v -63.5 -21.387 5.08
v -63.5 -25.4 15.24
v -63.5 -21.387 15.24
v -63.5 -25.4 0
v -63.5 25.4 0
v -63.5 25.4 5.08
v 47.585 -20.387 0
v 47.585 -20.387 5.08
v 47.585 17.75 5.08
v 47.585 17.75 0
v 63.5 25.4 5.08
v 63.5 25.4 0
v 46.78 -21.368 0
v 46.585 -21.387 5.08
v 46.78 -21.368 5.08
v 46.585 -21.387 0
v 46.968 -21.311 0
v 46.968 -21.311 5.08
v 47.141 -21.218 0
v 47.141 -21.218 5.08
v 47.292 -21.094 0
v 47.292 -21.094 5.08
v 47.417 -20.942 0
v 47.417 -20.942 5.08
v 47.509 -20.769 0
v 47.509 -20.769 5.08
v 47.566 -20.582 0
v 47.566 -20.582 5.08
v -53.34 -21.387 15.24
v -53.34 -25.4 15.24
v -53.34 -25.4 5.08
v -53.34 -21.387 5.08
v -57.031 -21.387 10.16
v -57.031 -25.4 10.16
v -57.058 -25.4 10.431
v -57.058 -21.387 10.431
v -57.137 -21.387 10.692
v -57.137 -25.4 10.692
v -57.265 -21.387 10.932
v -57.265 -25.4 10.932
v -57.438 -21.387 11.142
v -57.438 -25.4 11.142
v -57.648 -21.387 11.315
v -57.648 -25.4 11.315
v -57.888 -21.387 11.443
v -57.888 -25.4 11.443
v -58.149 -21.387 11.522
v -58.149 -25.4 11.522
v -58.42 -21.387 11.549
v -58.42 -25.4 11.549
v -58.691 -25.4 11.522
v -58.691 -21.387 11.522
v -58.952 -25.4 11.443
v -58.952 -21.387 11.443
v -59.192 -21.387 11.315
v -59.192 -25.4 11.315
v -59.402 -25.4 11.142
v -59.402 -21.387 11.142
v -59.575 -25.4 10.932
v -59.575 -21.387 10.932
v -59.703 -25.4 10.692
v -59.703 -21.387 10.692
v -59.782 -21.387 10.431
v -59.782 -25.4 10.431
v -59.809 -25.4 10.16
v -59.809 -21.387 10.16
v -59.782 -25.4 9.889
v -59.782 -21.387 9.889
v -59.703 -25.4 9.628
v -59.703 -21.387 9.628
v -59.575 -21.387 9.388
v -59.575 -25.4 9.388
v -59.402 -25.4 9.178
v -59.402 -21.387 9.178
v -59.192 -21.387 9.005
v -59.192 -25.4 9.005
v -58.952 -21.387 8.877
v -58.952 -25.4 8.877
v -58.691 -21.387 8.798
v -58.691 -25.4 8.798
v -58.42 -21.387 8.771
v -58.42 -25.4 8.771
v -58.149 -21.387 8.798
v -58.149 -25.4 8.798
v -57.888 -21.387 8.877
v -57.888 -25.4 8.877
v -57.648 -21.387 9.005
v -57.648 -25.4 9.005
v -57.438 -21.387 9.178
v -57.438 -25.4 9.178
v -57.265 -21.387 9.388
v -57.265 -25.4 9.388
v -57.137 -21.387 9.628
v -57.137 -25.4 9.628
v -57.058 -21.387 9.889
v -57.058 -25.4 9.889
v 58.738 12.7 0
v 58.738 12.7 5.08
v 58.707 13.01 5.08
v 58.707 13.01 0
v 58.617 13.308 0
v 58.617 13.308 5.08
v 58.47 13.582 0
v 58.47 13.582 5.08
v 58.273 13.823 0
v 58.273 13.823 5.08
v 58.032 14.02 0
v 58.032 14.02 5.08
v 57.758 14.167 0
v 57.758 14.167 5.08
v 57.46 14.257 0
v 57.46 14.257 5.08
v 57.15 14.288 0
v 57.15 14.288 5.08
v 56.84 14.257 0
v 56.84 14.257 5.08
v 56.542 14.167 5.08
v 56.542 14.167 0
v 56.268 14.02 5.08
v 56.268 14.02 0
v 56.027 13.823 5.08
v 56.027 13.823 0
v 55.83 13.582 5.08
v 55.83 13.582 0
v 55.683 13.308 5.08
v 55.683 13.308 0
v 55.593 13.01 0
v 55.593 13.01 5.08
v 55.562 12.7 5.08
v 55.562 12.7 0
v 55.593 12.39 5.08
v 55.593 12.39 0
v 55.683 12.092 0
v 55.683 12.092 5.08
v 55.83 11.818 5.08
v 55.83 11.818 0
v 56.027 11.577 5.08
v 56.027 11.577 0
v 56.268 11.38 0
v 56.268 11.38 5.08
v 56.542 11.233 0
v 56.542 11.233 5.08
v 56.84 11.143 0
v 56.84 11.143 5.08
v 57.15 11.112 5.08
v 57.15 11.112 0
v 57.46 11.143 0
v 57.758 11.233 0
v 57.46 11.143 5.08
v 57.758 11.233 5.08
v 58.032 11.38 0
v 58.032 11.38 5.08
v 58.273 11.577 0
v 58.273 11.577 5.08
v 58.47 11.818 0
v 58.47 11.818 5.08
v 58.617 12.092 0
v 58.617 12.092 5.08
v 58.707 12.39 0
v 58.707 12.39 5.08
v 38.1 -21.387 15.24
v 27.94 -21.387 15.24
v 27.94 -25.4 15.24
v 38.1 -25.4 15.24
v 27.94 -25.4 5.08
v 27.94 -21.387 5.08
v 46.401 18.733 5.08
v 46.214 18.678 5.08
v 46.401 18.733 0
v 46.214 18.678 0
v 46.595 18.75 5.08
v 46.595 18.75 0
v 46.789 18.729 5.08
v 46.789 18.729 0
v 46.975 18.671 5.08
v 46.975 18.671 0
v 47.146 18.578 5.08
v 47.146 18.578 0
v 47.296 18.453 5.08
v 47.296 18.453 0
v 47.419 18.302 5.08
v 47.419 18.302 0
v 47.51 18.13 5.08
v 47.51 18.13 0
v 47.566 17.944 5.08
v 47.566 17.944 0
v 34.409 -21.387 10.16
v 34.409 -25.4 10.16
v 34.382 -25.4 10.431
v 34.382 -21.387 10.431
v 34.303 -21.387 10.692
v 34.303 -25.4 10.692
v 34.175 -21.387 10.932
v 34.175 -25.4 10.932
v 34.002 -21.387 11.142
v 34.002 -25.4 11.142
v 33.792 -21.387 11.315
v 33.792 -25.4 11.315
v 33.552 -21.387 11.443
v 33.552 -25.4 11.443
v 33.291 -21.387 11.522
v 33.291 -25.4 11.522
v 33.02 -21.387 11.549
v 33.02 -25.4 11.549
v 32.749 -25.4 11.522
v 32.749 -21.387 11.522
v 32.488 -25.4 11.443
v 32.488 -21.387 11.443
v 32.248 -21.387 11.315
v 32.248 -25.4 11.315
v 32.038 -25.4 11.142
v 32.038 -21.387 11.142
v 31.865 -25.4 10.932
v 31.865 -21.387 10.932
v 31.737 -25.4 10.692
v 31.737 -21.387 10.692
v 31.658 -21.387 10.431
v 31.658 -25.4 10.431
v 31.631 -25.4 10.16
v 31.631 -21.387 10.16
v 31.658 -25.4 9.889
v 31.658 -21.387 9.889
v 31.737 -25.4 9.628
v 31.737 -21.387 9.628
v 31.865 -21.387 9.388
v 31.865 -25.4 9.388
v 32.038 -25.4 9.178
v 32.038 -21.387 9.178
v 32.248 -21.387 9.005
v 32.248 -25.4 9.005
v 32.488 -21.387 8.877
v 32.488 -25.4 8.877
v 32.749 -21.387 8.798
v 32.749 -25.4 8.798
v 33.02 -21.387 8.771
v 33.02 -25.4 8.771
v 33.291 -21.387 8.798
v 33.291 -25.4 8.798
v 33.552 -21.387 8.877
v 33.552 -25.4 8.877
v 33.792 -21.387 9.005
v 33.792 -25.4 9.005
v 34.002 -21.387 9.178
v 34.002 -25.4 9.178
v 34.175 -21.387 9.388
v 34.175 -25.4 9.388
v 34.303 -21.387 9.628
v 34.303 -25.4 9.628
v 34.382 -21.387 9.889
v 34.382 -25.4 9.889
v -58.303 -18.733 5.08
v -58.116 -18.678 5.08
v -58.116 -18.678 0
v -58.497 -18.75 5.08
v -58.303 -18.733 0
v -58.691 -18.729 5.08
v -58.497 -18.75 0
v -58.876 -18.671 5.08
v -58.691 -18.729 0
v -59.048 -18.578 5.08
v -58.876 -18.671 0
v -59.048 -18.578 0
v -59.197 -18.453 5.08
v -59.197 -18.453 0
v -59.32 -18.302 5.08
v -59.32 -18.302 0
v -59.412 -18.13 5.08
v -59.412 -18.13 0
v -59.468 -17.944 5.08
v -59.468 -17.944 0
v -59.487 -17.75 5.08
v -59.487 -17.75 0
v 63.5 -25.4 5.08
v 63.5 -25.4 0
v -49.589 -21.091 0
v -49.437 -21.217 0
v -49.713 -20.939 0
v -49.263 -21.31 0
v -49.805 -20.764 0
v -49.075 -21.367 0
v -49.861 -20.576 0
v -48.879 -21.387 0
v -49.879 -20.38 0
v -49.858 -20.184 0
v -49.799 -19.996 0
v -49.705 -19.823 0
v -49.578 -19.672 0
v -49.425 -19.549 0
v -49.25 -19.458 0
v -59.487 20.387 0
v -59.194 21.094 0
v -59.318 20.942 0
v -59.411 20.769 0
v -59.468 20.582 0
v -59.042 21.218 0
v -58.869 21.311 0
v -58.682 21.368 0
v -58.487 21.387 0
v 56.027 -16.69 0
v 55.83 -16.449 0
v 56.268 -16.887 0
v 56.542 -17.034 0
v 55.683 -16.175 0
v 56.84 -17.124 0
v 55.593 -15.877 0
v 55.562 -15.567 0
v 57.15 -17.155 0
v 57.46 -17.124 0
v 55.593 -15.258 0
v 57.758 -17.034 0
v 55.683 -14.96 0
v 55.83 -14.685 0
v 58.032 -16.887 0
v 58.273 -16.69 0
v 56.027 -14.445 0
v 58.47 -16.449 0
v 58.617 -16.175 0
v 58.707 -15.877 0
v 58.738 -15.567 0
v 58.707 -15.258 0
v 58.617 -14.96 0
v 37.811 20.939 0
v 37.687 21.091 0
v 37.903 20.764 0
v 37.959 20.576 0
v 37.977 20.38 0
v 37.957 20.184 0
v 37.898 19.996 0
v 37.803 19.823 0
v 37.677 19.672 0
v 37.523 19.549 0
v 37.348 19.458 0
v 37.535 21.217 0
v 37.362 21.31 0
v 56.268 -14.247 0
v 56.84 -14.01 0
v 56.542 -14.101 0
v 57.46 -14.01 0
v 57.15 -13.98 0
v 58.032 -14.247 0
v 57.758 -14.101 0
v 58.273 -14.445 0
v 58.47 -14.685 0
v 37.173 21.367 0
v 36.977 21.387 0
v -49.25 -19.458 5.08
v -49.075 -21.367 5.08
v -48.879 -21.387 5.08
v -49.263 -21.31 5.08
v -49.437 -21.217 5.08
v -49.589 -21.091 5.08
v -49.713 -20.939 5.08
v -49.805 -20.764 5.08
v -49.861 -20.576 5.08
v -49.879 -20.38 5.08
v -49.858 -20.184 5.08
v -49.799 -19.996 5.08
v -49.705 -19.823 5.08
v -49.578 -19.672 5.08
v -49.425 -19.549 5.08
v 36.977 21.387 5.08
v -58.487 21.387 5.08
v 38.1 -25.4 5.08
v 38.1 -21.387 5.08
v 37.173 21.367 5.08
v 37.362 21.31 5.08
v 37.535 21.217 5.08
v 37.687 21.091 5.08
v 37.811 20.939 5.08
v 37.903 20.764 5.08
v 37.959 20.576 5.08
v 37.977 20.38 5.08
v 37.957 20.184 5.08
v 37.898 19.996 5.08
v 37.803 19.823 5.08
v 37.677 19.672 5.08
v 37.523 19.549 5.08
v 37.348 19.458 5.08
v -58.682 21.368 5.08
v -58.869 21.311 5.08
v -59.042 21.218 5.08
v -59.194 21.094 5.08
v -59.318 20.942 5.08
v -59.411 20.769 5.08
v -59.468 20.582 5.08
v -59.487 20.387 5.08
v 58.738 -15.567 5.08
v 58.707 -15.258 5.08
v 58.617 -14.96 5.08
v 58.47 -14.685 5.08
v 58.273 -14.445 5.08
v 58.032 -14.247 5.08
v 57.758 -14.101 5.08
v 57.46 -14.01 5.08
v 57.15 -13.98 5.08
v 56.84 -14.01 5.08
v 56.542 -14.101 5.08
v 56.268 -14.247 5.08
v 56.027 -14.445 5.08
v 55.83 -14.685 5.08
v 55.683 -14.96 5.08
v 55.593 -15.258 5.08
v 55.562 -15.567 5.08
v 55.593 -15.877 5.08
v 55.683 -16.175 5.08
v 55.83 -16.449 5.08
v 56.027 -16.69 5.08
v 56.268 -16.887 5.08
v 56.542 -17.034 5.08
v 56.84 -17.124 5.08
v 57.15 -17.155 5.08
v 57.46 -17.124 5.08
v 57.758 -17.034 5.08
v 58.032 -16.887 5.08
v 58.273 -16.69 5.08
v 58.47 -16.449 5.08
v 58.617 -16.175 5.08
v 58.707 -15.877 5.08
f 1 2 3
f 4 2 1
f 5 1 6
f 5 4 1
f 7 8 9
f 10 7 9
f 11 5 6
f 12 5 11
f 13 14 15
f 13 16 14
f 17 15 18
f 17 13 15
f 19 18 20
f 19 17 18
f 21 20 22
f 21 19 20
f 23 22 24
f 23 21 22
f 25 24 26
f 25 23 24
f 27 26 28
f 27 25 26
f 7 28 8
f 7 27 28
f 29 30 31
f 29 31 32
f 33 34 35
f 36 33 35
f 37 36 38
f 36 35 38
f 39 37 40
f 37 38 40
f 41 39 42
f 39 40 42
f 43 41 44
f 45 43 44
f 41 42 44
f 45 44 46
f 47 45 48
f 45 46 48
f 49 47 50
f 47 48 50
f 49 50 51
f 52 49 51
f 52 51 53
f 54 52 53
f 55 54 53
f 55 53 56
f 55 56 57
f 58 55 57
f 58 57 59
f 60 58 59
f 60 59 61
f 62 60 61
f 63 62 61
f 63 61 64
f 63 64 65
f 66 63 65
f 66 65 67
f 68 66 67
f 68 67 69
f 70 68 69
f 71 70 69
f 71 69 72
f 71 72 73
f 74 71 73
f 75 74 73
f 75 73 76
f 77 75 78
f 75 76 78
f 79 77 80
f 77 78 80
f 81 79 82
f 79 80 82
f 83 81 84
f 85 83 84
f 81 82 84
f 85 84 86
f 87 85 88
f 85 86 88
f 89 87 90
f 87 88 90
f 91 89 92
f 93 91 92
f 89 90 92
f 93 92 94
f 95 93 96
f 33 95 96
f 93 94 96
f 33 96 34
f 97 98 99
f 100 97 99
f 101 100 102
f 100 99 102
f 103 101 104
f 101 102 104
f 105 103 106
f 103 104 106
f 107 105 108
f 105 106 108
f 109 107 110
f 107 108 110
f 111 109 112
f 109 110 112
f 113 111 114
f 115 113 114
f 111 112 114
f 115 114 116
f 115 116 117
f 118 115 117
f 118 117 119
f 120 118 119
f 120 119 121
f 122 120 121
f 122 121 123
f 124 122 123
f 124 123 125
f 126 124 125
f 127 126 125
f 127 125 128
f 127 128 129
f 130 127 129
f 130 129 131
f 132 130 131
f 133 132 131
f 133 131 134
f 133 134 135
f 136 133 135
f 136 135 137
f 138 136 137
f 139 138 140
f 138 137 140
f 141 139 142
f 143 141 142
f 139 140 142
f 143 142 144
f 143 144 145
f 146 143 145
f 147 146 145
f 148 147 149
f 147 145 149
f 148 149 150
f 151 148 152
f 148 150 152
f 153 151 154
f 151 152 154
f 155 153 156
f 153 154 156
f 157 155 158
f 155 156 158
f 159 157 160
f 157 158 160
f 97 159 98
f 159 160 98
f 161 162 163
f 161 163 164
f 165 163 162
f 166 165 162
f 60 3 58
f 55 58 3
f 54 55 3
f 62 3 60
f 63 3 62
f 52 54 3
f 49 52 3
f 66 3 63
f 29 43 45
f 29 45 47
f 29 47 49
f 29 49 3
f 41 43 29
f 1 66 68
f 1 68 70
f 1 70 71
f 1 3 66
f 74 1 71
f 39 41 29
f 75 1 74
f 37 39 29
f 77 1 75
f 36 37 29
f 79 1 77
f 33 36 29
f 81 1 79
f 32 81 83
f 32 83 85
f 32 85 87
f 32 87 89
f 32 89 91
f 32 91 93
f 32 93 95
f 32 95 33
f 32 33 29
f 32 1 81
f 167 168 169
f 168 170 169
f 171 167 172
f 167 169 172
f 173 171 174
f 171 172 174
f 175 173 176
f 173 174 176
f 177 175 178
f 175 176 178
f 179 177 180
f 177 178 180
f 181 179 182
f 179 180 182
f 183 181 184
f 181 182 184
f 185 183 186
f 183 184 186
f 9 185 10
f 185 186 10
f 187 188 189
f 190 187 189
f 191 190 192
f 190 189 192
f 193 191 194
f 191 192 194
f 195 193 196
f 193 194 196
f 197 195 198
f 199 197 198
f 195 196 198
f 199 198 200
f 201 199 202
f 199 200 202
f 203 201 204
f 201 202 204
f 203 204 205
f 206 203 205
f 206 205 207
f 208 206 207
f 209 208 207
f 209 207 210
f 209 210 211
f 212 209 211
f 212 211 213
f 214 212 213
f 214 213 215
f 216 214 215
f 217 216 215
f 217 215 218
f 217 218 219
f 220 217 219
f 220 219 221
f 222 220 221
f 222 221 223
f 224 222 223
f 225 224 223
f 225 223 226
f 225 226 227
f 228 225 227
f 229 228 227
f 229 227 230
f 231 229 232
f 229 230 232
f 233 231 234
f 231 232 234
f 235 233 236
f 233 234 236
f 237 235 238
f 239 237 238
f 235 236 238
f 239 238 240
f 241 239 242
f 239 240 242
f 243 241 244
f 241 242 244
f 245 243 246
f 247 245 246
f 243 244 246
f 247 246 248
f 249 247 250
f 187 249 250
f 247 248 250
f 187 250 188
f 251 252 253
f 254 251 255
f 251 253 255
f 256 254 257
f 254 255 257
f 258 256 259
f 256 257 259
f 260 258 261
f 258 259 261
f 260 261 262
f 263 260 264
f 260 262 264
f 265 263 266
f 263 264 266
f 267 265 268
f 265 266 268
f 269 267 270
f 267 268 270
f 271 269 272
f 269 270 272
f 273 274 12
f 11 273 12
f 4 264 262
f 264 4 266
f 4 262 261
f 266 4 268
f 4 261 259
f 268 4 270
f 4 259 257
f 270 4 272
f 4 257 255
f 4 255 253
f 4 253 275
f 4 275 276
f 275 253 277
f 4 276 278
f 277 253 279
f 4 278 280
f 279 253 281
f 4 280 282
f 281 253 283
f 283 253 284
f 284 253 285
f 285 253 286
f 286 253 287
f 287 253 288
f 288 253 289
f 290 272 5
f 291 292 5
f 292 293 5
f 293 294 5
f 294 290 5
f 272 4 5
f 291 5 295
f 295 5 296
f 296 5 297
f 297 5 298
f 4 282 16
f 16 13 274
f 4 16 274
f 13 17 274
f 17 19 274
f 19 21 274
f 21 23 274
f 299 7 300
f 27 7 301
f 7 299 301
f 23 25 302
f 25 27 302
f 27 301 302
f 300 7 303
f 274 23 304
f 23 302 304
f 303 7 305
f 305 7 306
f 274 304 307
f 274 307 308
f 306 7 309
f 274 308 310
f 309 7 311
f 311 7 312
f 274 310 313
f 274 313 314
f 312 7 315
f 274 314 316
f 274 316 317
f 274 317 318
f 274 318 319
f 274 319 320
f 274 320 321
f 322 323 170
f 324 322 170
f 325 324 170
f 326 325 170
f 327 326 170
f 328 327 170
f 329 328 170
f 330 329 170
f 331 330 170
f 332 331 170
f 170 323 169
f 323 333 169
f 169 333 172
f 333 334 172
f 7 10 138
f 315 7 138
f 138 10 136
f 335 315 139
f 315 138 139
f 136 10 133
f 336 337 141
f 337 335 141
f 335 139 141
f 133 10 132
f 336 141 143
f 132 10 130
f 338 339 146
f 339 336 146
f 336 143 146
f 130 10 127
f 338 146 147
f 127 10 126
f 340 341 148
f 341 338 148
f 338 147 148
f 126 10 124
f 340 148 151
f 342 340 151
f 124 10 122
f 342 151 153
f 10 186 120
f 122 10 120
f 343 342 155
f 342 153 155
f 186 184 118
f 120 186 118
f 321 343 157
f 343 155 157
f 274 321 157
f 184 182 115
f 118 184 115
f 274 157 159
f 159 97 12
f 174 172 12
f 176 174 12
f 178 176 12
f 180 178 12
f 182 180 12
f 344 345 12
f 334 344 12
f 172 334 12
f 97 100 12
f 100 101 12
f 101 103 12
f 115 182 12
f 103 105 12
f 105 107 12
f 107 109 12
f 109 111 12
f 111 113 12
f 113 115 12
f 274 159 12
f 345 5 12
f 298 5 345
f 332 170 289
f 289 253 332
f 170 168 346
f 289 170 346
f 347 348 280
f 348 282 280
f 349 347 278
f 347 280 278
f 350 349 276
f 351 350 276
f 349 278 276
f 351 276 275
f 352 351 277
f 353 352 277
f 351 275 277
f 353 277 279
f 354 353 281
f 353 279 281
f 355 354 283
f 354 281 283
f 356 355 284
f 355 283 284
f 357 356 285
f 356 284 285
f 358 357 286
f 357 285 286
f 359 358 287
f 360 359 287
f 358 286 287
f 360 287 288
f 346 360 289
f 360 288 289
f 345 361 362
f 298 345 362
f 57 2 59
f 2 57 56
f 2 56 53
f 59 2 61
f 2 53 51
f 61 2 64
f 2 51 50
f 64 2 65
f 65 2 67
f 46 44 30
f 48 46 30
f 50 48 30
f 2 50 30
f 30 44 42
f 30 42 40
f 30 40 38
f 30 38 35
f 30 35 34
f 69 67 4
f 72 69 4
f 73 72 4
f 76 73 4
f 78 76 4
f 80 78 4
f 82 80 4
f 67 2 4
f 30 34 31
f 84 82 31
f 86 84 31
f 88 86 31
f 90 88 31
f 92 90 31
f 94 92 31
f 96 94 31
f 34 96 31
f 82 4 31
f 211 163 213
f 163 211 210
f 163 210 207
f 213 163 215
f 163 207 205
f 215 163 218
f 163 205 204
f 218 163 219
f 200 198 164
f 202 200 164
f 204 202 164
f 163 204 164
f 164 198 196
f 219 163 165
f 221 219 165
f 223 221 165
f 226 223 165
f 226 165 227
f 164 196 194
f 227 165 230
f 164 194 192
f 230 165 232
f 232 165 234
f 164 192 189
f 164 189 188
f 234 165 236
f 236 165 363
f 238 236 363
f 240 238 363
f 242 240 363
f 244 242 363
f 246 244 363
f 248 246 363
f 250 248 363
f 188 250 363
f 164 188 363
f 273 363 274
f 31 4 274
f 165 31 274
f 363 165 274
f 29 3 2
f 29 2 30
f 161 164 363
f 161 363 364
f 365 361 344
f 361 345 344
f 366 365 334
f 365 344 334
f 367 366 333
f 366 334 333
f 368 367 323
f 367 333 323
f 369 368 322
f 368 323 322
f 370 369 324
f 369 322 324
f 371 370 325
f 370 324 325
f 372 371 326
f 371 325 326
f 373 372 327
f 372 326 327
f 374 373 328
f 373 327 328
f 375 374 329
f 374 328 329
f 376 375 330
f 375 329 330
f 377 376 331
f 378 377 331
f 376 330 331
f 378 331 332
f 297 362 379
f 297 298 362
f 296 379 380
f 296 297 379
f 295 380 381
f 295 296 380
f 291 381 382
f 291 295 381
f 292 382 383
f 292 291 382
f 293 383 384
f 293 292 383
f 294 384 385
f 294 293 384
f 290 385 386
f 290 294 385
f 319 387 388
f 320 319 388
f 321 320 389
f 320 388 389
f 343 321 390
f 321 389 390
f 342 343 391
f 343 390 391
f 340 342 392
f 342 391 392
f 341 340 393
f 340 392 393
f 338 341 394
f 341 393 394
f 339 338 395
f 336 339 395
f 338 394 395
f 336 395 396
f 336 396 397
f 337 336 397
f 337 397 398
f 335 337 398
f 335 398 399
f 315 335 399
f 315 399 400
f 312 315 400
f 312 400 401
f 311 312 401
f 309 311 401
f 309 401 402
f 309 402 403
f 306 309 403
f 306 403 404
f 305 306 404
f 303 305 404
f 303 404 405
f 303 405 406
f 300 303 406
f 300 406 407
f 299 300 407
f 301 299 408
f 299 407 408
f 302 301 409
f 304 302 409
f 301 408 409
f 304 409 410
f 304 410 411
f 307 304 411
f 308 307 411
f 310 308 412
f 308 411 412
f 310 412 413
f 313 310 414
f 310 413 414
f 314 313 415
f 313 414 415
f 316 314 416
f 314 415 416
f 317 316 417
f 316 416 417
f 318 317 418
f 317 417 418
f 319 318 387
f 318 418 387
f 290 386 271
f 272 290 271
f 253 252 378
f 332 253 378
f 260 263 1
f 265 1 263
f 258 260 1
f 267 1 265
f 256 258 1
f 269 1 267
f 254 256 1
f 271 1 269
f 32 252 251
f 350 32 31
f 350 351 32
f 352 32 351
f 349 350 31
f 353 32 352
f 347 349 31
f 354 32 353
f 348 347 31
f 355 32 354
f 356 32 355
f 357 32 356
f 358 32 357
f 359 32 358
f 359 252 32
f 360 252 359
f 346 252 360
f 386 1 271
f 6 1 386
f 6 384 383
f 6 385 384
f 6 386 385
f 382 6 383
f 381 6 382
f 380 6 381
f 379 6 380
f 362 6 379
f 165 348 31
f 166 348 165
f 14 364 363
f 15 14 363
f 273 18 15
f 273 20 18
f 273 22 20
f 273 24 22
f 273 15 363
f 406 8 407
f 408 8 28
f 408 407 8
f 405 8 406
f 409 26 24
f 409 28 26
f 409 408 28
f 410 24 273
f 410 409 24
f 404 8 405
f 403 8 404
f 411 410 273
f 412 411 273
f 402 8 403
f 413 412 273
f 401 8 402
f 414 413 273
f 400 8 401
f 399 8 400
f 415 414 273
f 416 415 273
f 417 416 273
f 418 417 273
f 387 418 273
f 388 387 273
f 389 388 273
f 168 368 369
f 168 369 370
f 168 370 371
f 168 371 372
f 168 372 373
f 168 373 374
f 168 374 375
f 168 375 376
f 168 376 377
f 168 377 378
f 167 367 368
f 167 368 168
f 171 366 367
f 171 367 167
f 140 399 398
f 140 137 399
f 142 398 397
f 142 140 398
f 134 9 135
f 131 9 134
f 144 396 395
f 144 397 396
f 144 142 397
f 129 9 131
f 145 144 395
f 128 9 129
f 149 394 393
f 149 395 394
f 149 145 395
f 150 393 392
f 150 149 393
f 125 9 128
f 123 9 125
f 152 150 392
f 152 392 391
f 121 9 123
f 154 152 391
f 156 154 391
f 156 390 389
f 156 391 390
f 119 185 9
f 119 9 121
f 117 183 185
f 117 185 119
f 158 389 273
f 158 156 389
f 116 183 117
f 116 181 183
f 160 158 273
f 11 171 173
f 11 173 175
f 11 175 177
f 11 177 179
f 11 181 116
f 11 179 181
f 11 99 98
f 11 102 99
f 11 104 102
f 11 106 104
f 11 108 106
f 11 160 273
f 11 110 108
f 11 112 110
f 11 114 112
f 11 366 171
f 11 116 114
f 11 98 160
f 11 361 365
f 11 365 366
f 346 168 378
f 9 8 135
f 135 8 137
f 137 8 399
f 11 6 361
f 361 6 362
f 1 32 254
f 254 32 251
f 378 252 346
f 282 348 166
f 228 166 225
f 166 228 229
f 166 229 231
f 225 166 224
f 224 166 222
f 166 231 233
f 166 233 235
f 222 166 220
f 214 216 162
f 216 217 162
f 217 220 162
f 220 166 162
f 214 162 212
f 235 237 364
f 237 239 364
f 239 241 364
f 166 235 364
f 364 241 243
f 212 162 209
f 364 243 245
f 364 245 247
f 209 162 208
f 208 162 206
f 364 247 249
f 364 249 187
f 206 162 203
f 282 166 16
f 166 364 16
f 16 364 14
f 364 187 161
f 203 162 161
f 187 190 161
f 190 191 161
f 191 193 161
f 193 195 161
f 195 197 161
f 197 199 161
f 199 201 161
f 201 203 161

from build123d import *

# Parameters (mm, degrees)
SKETCH_W     = 127
SKETCH_H     = 50.8
PAD_DEPTH    = 5.08
SKETCH001_R  = 1.5875
POCKET_DEPTH = 5.081
FILLET_R     = 0.999998
FILLET001_R  = 0.999998
FILLET002_R  = 0.999998
SKETCH002_W  = 10.16
SKETCH002_H  = 4.0132
PAD001_DEPTH = 10.16
SKETCH003_R  = 1.389063
HOLE_DEPTH   = 50.801


with BuildPart() as part:
    # Sketch → Pad (new body)
    with BuildSketch(Plane.XY):
        Rectangle(SKETCH_W, SKETCH_H)
    extrude(amount=PAD_DEPTH)

    # Sketch001 (on Face6 of Pad) → Pocket (cut, through all)
    with BuildSketch(Plane.XY.offset(5.08)):
        with Locations((57.15, 12.7)):
            Circle(SKETCH001_R)
        with Locations((57.15, -15.567334)):
            Circle(SKETCH001_R)
        Polygon((-54.077858, -21.3868), (47.585089, -21.3868), (47.585089, 19.226009), align=None)
        Polygon((42.176147, 21.3868), (-59.4868, 21.3868), (-59.4868, -19.226009), align=None)
    extrude(amount=-POCKET_DEPTH, mode=Mode.SUBTRACT)

    # Fillet
    fillet_edges = [part.edges().sort_by_distance(p)[0] for p in [
        (-59.4868, 21.3868, 2.54),
        (47.585089, -21.3868, 2.54),
    ]]
    fillet(fillet_edges, radius=FILLET_R)

    # Fillet001
    fillet001_edges = [part.edges().sort_by_distance(p)[0] for p in [
        (-54.077858, -21.3868, 2.54),
        (42.176147, 21.3868, 2.54),
    ]]
    fillet(fillet001_edges, radius=FILLET001_R)

    # Fillet002
    fillet002_edges = [part.edges().sort_by_distance(p)[0] for p in [
        (47.585089, 19.226009, 2.54),
        (-59.4868, -19.226009, 2.54),
    ]]
    fillet(fillet002_edges, radius=FILLET002_R)

    # Sketch002 (on Face20 of Fillet002) → Pad001 (join)
    with BuildSketch(Plane.XY.offset(5.08)):
        with Locations((-58.42, -23.3934)):
            Rectangle(SKETCH002_W, SKETCH002_H)
        with Locations((33.02, -23.3934)):
            Rectangle(SKETCH002_W, SKETCH002_H)
    extrude(amount=PAD001_DEPTH)

    # Sketch003 (on Face22 of Pad001) → Hole (cut, through all)
    with BuildSketch(Plane.XZ.offset(25.4)):
        with Locations((-58.42, 10.16)):
            Circle(SKETCH003_R)
        with Locations((33.02, 10.16)):
            Circle(SKETCH003_R)
    extrude(amount=-HOLE_DEPTH, mode=Mode.SUBTRACT)


solid = part.part
